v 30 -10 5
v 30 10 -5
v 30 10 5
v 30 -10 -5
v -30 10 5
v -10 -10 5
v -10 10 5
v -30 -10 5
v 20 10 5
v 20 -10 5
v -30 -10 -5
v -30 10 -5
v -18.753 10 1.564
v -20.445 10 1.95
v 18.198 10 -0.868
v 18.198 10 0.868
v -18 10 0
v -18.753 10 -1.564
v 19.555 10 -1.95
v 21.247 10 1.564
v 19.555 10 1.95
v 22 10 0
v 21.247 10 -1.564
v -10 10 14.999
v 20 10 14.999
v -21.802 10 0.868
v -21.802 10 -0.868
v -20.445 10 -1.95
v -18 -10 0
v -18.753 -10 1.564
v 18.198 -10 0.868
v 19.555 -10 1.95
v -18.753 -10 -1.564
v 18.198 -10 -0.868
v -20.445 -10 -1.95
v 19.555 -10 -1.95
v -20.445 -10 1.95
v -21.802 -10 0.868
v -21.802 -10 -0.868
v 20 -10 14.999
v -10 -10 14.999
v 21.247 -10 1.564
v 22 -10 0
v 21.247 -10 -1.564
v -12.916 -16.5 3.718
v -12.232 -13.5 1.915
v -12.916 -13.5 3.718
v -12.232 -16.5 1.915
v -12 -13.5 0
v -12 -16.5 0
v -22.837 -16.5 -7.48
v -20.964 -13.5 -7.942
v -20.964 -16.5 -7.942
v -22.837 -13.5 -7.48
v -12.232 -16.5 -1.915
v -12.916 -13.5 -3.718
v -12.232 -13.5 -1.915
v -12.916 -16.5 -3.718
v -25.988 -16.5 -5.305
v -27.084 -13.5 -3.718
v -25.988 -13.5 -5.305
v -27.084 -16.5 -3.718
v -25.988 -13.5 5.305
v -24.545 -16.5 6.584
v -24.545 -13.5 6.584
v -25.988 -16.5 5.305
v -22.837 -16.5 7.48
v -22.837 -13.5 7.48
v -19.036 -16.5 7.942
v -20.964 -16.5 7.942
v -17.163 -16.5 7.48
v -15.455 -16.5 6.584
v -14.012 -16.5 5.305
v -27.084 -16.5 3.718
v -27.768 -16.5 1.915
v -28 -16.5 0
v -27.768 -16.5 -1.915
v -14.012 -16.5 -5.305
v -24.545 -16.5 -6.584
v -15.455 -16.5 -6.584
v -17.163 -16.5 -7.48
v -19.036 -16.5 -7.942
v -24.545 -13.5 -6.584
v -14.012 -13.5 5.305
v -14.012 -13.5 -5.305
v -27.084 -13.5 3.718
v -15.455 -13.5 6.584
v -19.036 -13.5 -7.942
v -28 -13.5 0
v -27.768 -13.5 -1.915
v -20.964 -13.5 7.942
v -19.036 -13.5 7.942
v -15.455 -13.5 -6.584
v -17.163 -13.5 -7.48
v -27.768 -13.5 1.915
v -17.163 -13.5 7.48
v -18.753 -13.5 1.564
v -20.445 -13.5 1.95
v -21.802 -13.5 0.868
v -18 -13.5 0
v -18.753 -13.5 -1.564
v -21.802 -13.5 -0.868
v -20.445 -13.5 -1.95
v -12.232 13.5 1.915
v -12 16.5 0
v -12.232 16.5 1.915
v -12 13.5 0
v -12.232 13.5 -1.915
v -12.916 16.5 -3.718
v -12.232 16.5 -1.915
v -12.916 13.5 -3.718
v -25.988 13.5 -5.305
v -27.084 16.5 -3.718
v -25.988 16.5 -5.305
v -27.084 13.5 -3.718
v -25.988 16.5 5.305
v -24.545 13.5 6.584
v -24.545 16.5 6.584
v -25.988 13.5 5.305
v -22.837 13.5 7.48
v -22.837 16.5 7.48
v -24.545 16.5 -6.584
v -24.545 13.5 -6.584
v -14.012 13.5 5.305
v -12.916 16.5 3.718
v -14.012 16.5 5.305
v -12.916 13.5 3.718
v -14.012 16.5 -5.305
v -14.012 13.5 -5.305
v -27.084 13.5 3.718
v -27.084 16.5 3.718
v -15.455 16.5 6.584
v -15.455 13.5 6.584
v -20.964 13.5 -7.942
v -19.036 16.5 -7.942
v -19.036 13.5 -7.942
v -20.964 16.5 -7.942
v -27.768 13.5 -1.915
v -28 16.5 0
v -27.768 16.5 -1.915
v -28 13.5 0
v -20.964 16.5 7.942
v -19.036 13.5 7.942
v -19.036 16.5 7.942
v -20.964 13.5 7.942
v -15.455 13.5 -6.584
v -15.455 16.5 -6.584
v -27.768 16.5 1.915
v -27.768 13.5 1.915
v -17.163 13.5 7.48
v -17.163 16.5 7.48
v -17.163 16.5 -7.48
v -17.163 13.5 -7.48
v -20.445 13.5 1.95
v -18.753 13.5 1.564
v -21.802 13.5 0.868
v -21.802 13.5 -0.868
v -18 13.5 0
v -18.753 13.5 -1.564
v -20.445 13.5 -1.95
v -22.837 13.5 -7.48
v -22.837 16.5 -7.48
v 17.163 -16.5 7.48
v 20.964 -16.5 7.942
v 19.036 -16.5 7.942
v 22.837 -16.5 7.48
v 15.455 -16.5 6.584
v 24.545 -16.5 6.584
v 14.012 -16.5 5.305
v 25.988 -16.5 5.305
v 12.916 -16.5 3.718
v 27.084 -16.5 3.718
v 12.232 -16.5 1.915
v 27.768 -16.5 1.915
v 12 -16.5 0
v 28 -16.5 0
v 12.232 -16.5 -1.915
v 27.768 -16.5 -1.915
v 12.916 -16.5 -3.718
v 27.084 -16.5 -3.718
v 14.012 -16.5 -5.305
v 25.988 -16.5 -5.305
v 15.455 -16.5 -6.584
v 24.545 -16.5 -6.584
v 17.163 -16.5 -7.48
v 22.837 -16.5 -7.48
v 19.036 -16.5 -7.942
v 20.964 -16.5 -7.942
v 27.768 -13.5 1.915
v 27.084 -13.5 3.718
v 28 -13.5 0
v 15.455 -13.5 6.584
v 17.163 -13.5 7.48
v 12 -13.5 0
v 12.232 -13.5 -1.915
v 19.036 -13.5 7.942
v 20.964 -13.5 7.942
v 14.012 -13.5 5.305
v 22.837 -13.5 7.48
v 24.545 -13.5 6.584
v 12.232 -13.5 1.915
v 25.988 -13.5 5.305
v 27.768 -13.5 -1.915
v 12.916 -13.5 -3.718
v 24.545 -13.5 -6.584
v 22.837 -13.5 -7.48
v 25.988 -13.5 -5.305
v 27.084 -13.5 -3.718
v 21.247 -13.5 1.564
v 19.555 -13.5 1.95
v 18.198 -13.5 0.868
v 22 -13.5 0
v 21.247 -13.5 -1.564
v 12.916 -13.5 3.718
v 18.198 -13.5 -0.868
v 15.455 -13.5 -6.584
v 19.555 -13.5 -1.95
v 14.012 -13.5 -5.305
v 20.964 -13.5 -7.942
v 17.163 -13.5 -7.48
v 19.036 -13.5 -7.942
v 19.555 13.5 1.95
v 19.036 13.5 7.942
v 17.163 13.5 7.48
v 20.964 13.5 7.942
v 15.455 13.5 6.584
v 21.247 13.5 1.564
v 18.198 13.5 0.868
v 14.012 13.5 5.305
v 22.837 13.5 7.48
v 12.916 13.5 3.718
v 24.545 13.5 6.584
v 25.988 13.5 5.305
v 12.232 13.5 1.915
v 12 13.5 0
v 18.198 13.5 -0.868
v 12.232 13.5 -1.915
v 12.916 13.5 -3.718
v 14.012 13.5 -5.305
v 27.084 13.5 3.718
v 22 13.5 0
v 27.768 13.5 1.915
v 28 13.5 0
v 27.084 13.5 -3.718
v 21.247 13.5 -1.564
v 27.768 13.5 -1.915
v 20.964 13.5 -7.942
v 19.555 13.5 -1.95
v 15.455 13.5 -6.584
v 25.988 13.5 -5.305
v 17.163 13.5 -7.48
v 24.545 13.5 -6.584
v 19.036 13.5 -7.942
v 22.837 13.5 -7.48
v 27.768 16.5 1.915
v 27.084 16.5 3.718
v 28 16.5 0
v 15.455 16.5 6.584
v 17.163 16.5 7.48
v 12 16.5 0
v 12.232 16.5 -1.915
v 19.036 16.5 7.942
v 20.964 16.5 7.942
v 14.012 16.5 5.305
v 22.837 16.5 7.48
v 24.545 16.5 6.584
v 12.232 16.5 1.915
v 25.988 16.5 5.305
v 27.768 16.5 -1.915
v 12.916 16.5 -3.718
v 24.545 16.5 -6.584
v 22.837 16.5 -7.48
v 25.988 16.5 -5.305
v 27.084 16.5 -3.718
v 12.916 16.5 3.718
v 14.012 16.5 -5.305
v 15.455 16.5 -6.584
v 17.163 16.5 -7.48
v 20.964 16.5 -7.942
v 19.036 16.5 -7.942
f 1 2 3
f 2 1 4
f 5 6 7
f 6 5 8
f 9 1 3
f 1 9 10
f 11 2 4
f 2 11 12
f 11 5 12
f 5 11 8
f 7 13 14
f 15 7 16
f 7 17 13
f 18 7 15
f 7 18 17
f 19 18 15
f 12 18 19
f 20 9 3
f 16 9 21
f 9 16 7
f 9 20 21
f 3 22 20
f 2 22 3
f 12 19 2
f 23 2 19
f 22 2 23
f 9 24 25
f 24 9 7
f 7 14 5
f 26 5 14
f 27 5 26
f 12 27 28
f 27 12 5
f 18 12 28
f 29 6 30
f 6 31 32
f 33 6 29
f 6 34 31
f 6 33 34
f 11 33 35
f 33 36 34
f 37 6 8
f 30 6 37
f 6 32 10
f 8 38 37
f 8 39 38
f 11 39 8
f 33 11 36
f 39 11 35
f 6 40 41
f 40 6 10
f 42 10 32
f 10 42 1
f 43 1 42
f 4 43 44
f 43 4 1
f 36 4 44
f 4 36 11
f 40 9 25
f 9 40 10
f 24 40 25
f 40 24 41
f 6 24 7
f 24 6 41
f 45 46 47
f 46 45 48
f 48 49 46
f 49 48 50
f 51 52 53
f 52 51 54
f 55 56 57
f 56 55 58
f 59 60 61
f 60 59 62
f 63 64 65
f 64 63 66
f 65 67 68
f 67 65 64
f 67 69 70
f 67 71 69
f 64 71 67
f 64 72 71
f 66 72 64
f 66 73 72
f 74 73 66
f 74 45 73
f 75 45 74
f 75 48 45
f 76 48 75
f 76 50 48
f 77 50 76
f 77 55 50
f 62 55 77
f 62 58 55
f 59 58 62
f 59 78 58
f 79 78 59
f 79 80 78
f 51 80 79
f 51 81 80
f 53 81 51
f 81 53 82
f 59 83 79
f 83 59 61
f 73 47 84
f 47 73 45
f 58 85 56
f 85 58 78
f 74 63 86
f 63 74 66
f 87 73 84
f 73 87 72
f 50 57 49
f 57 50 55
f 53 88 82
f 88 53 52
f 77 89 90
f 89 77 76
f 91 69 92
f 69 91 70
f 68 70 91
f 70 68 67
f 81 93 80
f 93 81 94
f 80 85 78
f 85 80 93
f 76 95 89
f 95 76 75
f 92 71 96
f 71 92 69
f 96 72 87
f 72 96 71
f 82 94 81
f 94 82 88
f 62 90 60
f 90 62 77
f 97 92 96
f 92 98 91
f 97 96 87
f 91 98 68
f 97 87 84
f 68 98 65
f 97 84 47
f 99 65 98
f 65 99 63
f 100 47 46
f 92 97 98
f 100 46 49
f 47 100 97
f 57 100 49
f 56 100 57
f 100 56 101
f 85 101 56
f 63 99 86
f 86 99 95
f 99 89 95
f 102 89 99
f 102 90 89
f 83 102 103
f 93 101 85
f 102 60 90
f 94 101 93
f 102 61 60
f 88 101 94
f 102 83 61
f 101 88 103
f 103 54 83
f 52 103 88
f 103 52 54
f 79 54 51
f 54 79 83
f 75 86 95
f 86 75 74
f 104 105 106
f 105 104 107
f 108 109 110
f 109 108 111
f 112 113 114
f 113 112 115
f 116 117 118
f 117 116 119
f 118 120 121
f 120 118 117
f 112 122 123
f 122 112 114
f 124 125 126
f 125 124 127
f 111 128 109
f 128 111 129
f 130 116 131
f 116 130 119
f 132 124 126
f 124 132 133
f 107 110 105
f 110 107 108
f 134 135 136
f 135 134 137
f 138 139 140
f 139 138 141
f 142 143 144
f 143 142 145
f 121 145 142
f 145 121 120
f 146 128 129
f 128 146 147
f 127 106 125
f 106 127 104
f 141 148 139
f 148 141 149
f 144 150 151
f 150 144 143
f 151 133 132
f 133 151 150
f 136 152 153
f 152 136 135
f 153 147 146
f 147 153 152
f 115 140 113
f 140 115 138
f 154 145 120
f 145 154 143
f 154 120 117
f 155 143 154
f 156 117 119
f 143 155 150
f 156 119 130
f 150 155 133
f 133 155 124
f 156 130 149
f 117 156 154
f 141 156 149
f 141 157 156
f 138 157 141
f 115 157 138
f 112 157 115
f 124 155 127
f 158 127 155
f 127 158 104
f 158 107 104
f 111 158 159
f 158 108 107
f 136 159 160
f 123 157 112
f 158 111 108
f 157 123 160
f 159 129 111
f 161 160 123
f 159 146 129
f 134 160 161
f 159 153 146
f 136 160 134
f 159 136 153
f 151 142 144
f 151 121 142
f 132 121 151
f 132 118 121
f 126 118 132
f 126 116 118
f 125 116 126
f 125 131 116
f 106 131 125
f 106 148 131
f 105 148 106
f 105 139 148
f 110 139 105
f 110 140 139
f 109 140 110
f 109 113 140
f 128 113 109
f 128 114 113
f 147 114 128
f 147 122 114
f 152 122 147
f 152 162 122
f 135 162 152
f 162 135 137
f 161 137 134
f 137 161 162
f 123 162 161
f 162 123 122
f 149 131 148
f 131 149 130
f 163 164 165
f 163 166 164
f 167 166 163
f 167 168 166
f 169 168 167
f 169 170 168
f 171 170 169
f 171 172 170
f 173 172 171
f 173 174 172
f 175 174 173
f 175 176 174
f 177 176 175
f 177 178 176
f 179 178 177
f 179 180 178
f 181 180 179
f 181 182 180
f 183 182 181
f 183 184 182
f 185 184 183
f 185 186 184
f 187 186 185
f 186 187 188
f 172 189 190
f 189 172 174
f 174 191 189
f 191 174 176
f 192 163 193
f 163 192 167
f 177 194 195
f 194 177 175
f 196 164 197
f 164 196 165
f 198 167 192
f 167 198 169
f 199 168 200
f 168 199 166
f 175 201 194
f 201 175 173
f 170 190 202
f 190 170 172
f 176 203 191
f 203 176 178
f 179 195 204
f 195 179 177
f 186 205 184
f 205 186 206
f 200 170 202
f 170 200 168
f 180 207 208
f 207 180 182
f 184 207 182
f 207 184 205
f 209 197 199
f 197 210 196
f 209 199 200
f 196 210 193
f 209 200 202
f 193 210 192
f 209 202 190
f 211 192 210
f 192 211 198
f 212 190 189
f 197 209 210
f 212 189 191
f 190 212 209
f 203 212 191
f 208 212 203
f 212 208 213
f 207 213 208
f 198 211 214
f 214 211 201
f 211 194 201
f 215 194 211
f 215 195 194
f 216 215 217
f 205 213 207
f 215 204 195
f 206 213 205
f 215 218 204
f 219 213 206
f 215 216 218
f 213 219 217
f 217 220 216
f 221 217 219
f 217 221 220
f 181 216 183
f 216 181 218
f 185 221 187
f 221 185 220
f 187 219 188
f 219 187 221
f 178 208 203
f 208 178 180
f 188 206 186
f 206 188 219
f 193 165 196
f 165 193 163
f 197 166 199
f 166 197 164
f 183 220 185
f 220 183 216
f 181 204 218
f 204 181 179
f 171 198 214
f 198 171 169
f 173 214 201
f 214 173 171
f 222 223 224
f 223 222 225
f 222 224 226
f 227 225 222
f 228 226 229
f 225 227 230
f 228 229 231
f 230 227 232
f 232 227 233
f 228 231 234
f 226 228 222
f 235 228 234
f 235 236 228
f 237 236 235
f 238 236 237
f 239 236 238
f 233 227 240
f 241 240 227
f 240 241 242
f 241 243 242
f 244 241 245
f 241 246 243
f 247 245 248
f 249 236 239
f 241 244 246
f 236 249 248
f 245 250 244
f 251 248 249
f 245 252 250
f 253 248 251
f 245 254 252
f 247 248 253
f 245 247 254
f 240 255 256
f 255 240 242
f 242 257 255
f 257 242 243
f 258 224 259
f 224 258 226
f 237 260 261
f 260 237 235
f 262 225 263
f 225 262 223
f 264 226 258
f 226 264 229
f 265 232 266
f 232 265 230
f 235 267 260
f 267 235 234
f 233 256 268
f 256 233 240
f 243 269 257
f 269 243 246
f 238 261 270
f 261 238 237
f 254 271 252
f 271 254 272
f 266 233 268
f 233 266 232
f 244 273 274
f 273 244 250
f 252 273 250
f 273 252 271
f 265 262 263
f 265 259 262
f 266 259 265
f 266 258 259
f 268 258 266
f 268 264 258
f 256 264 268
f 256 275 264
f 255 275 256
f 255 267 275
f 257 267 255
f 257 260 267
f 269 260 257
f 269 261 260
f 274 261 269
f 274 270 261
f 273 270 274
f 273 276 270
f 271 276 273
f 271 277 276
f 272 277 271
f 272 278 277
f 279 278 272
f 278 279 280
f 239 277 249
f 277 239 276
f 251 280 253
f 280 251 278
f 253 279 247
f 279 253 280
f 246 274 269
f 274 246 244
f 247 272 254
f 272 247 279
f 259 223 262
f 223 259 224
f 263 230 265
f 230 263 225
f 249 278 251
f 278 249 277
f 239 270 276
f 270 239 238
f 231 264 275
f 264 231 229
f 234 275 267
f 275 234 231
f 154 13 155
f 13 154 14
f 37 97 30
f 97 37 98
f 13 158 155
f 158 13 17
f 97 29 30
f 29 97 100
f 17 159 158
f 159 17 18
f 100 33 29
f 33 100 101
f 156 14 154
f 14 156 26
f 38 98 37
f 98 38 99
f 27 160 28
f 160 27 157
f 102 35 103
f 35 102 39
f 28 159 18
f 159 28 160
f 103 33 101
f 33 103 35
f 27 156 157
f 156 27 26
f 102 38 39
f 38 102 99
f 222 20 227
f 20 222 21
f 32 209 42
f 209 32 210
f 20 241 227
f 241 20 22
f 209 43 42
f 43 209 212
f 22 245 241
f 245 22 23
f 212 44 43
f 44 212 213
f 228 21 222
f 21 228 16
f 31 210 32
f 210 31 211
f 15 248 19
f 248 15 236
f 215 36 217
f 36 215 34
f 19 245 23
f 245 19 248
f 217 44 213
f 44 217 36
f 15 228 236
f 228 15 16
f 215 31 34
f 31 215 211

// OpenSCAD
cube([60,20,10],center=true);
translate([5,0,10 - 0.001])
    cube([30,20,10],center=true);
translate([-20,-15,0])
    rotate([90,0,0])
    cylinder(h=3,r=8,center=true);
translate([-20,15,0])
    rotate([90,0,0])
    cylinder(h=3,r=8,center=true);
translate([20,-15,0])
    rotate([90,0,0])
    cylinder(h=3,r=8,center=true);
translate([20,15,0])
    rotate([90,0,0])
    cylinder(h=3,r=8,center=true);
translate([-20,0,0])
    rotate([90,0,0])
    cylinder(h=30,r=2,center=true);
translate([20,0,0])
    rotate([90,0,0])
    cylinder(h=30,r=2,center=true);
